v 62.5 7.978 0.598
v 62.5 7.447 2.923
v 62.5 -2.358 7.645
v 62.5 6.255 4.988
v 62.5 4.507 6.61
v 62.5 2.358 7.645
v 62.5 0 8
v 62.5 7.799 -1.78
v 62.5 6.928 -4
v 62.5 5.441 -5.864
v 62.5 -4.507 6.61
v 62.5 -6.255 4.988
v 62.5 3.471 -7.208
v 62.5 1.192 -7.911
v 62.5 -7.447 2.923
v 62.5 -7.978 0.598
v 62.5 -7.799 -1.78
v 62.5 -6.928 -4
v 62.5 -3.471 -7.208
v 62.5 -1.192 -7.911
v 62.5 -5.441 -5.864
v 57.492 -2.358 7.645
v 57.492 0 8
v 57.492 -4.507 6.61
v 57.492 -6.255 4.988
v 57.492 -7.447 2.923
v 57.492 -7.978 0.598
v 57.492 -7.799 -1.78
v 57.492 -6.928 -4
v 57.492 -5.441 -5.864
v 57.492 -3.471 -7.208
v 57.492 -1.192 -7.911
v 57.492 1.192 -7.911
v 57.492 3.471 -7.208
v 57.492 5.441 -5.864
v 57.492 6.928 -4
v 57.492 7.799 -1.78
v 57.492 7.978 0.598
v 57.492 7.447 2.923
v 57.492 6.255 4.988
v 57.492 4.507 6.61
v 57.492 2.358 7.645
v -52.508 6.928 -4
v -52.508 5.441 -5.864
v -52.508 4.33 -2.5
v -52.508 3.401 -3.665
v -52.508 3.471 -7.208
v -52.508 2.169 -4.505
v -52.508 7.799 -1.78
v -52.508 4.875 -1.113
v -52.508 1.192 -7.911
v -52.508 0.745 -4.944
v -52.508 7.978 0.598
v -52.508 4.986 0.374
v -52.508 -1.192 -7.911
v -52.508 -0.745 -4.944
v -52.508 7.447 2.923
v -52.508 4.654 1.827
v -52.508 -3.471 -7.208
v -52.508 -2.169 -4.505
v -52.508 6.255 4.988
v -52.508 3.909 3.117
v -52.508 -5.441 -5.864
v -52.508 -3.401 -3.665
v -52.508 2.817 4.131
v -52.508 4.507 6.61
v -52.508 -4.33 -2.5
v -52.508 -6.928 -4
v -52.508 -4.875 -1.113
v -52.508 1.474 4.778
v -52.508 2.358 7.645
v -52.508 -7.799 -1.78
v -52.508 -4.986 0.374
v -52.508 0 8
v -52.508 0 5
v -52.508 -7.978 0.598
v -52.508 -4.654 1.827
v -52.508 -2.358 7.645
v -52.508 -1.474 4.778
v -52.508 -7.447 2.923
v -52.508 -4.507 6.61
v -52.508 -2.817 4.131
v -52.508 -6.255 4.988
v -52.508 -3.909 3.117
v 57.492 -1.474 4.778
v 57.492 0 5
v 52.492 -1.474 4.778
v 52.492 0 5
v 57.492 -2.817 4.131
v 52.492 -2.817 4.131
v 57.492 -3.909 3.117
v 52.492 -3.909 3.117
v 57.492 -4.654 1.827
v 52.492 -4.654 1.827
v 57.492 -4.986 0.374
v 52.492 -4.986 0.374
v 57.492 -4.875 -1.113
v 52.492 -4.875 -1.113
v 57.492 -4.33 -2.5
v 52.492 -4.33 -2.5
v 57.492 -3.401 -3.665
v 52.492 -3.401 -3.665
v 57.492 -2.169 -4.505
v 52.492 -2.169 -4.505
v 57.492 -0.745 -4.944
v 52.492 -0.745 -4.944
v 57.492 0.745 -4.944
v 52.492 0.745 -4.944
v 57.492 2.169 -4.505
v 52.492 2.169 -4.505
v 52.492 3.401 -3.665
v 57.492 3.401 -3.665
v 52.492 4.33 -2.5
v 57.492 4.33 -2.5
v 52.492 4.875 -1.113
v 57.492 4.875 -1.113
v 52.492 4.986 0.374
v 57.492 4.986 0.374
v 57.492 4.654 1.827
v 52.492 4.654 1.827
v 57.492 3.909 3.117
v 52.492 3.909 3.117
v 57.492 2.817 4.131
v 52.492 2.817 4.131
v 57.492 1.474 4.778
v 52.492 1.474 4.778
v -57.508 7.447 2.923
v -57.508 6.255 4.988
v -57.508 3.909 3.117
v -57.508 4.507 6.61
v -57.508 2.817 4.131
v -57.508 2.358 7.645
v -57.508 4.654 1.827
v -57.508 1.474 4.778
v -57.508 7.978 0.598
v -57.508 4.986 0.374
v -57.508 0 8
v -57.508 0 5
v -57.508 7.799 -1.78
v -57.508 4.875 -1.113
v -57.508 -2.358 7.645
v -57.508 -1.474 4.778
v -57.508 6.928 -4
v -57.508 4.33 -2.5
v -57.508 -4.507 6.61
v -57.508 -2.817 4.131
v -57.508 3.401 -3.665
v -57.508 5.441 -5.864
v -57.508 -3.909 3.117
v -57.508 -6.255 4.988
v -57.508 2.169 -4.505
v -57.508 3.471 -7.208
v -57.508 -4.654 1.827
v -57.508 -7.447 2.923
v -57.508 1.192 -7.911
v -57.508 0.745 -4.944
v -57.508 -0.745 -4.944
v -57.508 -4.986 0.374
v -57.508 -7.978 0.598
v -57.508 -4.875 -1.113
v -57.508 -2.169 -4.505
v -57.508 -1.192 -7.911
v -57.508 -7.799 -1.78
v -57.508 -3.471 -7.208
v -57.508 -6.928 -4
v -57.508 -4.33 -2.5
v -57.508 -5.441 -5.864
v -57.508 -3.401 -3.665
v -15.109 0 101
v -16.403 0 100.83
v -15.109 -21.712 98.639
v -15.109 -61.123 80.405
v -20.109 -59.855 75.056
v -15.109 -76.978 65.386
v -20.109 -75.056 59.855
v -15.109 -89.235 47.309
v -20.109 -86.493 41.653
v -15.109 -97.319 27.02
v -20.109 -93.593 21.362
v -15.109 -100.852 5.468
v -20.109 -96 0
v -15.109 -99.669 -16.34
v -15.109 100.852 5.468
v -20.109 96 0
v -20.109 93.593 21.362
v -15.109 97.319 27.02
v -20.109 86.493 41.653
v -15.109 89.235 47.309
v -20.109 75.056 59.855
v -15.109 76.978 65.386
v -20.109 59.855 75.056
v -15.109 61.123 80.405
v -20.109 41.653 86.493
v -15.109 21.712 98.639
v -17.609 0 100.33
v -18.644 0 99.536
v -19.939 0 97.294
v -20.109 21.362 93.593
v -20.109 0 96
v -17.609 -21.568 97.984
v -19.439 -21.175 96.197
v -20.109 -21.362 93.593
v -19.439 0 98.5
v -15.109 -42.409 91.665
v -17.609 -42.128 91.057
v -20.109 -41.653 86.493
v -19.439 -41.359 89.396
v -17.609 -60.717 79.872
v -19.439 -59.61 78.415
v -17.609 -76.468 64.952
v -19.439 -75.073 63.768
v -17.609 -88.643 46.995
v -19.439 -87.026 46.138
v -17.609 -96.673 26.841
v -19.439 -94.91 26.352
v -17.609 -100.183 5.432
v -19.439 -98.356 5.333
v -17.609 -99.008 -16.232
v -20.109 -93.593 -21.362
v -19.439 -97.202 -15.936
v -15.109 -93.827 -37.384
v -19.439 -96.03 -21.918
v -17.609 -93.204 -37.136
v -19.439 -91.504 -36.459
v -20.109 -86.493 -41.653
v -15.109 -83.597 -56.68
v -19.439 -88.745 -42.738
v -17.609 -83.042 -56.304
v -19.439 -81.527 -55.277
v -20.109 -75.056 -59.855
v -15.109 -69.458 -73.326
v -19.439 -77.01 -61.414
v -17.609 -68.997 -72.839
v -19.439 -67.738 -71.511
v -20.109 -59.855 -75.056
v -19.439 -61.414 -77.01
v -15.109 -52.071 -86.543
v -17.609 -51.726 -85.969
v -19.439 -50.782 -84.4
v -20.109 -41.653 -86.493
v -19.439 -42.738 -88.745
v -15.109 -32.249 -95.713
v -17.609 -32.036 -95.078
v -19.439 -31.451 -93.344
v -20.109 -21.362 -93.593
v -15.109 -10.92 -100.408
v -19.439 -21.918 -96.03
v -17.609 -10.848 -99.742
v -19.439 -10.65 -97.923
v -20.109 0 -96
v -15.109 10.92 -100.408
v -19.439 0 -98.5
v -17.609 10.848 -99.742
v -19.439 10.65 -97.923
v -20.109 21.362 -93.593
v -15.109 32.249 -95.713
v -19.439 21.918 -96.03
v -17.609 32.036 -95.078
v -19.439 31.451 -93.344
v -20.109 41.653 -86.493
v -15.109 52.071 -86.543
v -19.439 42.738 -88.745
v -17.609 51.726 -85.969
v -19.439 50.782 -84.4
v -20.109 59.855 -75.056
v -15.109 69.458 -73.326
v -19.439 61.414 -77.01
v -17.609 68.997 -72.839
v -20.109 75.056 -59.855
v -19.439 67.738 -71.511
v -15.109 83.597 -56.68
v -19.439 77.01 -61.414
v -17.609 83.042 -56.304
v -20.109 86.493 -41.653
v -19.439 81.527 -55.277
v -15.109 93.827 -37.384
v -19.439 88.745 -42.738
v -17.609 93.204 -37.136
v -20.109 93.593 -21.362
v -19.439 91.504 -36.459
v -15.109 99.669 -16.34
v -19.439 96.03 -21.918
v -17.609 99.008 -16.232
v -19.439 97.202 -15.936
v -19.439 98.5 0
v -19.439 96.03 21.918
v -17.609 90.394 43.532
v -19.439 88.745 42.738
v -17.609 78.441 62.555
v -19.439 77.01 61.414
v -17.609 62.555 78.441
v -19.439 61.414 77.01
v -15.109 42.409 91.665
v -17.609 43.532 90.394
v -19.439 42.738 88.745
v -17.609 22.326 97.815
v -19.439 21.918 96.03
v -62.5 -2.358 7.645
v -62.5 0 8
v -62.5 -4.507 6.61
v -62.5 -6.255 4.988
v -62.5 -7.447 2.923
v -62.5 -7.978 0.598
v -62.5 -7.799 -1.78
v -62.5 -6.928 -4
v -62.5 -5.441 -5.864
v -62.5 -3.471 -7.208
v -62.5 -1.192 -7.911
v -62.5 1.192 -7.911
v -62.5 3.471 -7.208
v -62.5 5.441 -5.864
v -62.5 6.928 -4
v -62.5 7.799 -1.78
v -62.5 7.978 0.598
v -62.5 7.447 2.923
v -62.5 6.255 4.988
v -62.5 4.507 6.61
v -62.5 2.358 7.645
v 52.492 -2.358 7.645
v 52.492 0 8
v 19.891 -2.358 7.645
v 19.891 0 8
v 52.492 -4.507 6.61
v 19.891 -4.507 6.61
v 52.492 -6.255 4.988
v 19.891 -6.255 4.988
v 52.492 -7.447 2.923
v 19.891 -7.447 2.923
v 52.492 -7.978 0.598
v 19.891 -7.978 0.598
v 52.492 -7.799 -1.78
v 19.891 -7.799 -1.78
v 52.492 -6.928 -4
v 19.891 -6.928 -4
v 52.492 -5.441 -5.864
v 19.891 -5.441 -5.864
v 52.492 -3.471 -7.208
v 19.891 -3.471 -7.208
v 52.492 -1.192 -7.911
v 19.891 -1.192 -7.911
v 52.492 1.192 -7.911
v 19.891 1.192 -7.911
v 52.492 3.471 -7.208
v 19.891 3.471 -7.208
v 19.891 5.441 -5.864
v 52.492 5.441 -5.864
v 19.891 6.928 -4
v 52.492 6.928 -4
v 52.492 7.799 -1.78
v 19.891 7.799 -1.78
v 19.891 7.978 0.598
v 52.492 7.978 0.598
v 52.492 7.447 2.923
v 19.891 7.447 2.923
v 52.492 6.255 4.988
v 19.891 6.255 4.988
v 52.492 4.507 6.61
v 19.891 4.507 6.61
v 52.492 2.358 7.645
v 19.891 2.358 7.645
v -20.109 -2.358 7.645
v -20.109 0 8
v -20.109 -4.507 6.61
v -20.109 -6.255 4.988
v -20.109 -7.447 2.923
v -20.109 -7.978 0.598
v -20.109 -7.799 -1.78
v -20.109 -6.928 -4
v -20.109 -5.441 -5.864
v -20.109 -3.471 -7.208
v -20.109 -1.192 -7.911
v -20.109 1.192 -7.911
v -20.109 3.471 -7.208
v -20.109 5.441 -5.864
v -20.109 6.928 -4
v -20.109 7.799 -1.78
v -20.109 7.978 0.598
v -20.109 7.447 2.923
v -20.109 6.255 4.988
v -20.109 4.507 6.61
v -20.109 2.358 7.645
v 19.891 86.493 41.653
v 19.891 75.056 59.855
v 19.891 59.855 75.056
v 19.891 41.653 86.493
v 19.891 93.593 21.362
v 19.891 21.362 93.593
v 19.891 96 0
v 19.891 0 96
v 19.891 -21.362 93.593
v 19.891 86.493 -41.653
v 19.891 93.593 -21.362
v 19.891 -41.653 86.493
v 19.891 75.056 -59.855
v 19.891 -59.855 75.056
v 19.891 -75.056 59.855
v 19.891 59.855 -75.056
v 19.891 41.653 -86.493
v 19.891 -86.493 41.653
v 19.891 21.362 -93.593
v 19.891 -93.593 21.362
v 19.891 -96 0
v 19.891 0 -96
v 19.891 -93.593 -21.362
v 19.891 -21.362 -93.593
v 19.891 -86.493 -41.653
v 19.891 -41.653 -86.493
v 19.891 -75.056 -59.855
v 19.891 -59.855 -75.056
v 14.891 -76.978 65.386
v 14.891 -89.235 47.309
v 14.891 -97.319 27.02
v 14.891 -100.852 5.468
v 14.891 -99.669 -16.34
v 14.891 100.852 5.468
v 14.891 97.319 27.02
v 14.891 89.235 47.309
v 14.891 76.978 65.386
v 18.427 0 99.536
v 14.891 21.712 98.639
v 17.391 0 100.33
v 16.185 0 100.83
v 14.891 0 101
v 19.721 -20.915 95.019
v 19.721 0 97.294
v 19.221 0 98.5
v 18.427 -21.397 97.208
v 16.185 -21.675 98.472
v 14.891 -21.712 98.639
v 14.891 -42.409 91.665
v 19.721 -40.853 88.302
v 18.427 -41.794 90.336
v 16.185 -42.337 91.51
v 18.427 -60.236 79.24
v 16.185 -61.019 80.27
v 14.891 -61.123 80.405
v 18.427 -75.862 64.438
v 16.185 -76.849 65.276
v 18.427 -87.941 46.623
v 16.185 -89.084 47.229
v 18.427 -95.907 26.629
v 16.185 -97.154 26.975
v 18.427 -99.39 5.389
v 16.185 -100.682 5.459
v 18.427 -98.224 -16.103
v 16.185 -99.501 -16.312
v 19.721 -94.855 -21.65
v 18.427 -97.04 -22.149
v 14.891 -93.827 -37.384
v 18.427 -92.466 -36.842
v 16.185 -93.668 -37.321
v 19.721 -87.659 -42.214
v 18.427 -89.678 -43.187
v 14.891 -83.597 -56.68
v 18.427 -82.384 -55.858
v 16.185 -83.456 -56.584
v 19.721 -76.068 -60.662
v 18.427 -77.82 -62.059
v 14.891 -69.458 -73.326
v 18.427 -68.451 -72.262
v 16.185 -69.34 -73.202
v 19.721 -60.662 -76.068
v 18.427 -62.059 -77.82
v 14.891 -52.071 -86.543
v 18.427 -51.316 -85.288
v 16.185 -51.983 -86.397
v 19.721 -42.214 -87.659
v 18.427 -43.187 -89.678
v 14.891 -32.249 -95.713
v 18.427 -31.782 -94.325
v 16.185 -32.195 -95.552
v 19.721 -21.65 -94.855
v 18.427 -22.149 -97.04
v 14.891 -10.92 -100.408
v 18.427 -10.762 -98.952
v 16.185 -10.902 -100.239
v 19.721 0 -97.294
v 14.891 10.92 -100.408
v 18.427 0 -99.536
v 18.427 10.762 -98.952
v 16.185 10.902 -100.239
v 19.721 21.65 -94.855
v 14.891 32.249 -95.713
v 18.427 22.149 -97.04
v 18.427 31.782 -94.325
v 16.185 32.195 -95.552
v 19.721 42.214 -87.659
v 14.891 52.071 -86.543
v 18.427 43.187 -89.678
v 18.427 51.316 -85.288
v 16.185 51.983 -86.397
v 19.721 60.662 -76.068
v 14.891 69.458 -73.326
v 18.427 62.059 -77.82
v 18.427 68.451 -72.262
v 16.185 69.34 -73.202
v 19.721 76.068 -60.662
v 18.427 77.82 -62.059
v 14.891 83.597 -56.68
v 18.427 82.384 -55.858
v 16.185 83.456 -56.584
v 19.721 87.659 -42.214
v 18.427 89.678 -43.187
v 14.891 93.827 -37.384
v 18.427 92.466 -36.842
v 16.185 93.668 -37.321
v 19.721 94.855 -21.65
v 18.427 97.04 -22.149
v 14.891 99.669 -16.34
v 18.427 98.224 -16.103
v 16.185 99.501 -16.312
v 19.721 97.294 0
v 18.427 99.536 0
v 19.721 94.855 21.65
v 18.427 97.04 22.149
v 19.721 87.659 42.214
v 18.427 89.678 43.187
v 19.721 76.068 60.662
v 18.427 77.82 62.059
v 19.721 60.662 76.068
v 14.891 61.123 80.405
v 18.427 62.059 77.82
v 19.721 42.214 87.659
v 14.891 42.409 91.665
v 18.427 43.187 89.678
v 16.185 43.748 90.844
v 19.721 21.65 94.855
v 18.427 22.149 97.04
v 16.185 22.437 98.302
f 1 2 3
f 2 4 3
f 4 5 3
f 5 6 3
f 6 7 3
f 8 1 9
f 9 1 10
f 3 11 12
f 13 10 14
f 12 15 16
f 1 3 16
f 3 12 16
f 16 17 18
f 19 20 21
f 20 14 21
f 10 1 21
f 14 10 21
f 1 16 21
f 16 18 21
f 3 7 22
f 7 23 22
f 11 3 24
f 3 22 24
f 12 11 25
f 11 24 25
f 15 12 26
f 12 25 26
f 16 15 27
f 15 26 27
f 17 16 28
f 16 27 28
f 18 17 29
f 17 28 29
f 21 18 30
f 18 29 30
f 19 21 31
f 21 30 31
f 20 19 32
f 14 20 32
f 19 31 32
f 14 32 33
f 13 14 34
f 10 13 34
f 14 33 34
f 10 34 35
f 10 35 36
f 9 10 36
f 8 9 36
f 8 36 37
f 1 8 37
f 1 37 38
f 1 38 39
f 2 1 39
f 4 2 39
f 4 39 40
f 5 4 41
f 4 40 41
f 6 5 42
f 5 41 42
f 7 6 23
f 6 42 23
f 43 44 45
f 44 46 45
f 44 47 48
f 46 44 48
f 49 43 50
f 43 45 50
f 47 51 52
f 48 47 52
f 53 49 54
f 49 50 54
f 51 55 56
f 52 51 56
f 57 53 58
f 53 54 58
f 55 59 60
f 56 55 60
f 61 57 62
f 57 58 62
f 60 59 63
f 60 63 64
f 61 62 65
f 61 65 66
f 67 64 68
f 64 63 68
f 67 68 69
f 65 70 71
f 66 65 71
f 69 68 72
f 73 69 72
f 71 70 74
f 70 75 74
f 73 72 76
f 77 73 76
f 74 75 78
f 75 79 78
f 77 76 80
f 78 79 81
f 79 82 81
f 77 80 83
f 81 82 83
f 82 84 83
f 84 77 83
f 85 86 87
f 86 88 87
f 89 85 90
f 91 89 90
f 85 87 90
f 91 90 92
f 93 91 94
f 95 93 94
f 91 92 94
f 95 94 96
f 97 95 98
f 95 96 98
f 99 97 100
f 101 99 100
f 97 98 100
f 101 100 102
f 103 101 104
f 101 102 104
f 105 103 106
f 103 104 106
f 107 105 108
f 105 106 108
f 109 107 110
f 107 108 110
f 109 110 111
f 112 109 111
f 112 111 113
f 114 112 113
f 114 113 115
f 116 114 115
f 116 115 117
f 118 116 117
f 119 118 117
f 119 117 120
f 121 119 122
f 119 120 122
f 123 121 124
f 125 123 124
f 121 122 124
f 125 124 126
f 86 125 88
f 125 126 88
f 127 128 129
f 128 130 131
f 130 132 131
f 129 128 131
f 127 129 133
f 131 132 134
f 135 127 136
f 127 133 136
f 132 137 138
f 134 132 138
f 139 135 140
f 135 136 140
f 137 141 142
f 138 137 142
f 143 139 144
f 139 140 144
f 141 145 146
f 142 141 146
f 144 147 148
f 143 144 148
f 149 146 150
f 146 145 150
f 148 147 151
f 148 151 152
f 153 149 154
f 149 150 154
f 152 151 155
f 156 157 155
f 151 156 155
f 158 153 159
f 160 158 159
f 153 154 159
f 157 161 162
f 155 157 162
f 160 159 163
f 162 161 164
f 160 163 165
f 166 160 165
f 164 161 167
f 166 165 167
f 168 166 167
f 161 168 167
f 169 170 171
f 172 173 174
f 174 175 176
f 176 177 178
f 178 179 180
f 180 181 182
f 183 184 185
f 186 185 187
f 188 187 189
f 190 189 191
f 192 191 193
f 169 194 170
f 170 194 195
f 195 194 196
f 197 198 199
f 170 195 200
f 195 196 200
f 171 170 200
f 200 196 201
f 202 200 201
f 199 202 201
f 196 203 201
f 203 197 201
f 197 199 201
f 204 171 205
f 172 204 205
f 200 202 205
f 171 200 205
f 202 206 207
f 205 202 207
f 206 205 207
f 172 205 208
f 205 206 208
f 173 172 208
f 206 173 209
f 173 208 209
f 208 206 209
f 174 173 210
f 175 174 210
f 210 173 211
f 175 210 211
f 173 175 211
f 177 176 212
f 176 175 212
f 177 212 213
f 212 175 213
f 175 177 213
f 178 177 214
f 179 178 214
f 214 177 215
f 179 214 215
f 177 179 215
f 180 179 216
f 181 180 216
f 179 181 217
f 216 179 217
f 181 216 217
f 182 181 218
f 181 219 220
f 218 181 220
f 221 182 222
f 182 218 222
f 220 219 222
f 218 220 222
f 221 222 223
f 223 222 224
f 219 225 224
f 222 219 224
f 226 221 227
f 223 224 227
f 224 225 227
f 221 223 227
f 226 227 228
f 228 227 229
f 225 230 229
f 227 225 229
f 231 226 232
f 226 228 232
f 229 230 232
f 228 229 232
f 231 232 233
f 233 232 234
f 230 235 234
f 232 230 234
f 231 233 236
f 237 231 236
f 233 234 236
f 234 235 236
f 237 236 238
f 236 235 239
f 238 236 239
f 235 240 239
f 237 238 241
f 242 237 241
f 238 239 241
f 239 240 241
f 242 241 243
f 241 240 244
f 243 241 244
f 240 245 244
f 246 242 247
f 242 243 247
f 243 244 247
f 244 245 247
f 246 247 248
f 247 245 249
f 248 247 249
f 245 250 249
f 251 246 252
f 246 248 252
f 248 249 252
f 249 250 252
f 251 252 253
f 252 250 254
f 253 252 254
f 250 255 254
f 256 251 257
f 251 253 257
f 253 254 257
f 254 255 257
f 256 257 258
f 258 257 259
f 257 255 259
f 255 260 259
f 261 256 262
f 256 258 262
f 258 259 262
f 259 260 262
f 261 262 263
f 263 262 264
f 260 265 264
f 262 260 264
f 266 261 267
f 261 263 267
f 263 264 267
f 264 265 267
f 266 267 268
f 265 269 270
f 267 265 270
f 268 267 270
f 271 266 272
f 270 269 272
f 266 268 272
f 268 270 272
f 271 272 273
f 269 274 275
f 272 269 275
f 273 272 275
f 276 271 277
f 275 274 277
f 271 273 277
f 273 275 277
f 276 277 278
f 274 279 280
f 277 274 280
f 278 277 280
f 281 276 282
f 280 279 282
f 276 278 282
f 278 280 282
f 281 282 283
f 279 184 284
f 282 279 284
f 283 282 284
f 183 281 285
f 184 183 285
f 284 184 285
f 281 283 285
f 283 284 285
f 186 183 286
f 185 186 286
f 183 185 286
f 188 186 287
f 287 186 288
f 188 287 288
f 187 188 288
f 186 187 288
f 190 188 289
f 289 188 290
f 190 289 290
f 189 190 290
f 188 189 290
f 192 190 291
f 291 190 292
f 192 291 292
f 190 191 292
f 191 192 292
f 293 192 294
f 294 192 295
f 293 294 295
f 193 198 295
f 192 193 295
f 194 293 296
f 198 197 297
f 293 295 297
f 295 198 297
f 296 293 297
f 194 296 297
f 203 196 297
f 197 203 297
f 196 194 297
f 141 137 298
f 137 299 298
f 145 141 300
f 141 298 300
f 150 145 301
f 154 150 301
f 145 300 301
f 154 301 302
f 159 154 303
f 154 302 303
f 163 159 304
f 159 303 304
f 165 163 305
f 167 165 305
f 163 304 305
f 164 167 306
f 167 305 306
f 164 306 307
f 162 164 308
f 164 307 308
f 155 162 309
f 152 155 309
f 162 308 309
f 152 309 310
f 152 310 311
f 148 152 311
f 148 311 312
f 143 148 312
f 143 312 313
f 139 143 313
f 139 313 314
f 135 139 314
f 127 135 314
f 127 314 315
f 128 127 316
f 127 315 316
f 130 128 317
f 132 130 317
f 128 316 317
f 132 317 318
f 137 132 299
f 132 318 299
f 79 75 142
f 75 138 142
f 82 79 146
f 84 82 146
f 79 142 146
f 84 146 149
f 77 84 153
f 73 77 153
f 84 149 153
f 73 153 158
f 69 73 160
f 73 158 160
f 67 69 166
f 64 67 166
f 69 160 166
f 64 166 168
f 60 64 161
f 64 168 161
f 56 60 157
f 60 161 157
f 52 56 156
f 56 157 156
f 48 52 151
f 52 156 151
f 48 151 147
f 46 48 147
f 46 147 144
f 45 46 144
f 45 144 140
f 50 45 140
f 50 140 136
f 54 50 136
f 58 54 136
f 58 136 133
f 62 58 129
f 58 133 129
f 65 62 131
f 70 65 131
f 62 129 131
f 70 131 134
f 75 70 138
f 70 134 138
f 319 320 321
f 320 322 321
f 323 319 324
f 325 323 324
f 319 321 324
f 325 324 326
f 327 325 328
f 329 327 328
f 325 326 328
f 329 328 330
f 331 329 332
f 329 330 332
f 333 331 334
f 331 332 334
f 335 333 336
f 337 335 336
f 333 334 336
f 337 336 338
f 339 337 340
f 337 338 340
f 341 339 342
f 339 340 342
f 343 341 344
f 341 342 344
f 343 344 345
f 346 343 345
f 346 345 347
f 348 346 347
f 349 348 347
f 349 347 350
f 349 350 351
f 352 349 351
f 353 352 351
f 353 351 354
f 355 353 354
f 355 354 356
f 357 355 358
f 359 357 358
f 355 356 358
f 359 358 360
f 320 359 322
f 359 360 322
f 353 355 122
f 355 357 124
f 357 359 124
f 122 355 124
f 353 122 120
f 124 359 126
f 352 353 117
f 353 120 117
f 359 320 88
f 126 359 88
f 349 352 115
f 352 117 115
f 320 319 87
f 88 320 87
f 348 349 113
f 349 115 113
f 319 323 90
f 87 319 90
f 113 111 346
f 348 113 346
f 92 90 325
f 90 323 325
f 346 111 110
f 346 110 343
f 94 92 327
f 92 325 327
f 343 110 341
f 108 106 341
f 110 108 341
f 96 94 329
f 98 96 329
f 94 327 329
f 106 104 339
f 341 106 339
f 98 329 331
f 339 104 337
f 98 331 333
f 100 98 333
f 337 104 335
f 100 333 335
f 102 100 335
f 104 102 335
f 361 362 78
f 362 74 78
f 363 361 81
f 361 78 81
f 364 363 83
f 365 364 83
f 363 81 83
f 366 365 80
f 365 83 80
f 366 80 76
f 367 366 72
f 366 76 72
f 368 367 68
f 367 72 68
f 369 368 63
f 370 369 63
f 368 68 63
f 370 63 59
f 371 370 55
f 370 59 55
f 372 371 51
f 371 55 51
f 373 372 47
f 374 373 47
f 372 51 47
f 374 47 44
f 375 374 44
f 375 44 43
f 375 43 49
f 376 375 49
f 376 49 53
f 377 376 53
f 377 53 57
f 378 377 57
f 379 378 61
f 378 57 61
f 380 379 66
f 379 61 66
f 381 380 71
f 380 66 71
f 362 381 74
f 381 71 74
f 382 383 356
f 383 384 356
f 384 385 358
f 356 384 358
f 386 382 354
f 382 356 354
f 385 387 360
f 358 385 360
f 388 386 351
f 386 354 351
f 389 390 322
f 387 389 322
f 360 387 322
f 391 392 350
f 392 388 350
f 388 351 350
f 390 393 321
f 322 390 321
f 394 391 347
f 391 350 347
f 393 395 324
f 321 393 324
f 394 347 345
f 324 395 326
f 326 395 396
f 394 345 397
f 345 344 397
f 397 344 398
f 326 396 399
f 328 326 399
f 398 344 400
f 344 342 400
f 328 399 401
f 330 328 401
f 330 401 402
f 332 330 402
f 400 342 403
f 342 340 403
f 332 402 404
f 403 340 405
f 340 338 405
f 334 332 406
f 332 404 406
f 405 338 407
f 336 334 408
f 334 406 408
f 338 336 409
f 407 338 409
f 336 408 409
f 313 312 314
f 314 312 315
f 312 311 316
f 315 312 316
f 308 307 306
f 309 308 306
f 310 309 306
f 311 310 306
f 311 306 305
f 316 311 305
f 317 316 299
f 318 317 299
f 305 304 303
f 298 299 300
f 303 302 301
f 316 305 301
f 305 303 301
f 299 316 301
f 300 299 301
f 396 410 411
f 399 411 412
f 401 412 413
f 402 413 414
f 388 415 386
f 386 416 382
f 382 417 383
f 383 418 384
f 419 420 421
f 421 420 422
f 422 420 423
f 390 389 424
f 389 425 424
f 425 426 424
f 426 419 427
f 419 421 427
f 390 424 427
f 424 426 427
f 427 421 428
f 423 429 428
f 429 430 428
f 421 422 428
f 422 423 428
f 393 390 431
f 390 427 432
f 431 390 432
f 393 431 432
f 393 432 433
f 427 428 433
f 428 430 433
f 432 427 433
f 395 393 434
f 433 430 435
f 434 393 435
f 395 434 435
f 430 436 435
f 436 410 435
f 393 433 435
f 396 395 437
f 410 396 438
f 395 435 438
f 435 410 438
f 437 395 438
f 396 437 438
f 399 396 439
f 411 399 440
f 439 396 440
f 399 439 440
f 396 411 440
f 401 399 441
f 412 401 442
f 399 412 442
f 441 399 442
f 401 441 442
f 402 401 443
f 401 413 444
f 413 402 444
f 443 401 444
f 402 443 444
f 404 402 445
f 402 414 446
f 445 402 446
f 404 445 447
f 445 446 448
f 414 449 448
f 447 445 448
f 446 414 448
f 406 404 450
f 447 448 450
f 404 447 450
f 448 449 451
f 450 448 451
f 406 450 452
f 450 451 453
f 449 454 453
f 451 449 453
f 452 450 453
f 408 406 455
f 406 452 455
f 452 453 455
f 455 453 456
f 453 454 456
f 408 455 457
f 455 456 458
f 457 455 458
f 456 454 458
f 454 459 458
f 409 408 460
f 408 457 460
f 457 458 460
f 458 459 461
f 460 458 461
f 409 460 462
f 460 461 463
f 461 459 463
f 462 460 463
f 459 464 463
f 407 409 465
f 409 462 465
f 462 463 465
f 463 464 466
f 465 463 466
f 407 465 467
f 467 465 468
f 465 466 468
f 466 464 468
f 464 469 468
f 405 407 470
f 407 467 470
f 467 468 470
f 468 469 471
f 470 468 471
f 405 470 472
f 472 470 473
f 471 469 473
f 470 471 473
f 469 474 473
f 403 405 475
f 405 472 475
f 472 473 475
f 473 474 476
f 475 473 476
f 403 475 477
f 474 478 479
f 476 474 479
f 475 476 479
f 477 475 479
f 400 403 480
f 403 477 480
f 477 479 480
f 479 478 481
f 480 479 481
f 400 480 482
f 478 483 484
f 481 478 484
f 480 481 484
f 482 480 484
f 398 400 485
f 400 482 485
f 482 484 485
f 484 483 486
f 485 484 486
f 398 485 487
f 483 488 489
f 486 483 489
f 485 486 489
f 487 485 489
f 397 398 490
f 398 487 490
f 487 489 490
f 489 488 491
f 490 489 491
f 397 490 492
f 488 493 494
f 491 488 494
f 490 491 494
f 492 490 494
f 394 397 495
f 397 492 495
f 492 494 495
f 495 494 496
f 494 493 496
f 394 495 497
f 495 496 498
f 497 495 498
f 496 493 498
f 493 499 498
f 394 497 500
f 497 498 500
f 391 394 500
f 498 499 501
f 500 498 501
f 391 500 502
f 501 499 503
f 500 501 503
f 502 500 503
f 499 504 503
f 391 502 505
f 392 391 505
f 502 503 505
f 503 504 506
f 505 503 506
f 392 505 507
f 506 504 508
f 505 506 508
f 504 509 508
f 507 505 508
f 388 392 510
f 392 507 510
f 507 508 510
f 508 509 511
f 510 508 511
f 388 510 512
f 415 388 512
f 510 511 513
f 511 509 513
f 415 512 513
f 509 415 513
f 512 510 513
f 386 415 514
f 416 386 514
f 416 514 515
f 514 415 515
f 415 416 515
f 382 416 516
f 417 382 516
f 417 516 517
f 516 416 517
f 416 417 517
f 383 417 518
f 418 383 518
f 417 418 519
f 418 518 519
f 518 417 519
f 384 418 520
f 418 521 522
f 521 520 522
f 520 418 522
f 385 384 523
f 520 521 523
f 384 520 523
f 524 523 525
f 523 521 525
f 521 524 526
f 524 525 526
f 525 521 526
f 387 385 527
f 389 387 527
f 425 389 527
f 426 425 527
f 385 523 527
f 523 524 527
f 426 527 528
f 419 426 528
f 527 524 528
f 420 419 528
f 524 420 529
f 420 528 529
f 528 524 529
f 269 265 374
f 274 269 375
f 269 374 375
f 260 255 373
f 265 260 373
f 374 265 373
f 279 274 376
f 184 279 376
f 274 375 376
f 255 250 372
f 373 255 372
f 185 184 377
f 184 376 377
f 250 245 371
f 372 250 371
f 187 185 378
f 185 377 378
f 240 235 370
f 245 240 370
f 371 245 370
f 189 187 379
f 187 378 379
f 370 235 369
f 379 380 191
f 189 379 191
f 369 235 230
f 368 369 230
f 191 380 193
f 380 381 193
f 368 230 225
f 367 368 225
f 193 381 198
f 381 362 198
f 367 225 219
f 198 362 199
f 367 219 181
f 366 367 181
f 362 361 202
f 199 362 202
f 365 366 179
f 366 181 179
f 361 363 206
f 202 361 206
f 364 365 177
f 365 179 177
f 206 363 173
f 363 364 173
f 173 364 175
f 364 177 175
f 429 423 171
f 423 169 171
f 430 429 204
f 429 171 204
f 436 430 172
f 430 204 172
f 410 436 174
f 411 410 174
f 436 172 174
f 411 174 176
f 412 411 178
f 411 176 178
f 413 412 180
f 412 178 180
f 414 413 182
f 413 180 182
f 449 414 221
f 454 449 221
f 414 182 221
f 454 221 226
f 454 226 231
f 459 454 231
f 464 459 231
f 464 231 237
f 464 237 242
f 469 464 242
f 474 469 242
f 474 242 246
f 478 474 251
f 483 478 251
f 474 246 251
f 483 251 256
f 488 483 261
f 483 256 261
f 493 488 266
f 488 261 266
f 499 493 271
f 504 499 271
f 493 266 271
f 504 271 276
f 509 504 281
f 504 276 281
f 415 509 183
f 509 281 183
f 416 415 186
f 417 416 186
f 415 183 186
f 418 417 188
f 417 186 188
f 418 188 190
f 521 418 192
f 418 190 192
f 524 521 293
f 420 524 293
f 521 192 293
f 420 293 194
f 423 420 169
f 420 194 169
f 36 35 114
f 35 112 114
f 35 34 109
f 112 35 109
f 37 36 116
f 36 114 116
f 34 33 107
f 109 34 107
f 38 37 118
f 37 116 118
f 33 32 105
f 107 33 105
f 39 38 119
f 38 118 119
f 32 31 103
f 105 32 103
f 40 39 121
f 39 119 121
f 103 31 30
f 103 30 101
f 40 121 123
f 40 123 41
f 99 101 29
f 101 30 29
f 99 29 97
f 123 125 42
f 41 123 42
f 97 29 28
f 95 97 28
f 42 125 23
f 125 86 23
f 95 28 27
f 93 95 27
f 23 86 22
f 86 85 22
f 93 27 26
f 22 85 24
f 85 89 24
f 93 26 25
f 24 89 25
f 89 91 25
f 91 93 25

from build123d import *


with BuildPart() as f1:
    # F0 (on Front) → F1 (revolve)
    with BuildSketch(Plane.XZ):
        with BuildLine():
            Line((-57.507594, 8), (-62.5, 8))
            Line((-62.5, 8), (-62.5, 0))
            Line((-62.5, 0), (-20.108948, 0))
            Line((-20.108948, 0), (19.891052, 0))
            Line((19.891052, 0), (62.5, 0))
            Line((62.5, 0), (62.5, 8))
            Line((62.5, 8), (57.492453, 8))
            Line((57.492453, 8), (57.492453, 5))
            Line((57.492453, 5), (52.492453, 5))
            Line((52.492453, 5), (52.492453, 8))
            Line((52.492453, 8), (19.891052, 8))
            Line((19.891052, 8), (19.891052, 96))
            ThreePointArc((19.891052, 96), (18.426586, 99.535534), (14.891052, 101))
            Line((14.891052, 101), (-15.108948, 101))
            ThreePointArc((-15.108948, 101), (-18.644481, 99.535534), (-20.108948, 96))
            Line((-20.108948, 96), (-20.108948, 8))
            Line((-20.108948, 8), (-52.507594, 8))
            Line((-52.507594, 8), (-52.507594, 5))
            Line((-52.507594, 5), (-57.507594, 5))
            Line((-57.507594, 5), (-57.507594, 8))
        make_face()
    revolve(axis=Axis((-6.764503, 0, 0), (1, 0, 0)))


solid = f1.part
